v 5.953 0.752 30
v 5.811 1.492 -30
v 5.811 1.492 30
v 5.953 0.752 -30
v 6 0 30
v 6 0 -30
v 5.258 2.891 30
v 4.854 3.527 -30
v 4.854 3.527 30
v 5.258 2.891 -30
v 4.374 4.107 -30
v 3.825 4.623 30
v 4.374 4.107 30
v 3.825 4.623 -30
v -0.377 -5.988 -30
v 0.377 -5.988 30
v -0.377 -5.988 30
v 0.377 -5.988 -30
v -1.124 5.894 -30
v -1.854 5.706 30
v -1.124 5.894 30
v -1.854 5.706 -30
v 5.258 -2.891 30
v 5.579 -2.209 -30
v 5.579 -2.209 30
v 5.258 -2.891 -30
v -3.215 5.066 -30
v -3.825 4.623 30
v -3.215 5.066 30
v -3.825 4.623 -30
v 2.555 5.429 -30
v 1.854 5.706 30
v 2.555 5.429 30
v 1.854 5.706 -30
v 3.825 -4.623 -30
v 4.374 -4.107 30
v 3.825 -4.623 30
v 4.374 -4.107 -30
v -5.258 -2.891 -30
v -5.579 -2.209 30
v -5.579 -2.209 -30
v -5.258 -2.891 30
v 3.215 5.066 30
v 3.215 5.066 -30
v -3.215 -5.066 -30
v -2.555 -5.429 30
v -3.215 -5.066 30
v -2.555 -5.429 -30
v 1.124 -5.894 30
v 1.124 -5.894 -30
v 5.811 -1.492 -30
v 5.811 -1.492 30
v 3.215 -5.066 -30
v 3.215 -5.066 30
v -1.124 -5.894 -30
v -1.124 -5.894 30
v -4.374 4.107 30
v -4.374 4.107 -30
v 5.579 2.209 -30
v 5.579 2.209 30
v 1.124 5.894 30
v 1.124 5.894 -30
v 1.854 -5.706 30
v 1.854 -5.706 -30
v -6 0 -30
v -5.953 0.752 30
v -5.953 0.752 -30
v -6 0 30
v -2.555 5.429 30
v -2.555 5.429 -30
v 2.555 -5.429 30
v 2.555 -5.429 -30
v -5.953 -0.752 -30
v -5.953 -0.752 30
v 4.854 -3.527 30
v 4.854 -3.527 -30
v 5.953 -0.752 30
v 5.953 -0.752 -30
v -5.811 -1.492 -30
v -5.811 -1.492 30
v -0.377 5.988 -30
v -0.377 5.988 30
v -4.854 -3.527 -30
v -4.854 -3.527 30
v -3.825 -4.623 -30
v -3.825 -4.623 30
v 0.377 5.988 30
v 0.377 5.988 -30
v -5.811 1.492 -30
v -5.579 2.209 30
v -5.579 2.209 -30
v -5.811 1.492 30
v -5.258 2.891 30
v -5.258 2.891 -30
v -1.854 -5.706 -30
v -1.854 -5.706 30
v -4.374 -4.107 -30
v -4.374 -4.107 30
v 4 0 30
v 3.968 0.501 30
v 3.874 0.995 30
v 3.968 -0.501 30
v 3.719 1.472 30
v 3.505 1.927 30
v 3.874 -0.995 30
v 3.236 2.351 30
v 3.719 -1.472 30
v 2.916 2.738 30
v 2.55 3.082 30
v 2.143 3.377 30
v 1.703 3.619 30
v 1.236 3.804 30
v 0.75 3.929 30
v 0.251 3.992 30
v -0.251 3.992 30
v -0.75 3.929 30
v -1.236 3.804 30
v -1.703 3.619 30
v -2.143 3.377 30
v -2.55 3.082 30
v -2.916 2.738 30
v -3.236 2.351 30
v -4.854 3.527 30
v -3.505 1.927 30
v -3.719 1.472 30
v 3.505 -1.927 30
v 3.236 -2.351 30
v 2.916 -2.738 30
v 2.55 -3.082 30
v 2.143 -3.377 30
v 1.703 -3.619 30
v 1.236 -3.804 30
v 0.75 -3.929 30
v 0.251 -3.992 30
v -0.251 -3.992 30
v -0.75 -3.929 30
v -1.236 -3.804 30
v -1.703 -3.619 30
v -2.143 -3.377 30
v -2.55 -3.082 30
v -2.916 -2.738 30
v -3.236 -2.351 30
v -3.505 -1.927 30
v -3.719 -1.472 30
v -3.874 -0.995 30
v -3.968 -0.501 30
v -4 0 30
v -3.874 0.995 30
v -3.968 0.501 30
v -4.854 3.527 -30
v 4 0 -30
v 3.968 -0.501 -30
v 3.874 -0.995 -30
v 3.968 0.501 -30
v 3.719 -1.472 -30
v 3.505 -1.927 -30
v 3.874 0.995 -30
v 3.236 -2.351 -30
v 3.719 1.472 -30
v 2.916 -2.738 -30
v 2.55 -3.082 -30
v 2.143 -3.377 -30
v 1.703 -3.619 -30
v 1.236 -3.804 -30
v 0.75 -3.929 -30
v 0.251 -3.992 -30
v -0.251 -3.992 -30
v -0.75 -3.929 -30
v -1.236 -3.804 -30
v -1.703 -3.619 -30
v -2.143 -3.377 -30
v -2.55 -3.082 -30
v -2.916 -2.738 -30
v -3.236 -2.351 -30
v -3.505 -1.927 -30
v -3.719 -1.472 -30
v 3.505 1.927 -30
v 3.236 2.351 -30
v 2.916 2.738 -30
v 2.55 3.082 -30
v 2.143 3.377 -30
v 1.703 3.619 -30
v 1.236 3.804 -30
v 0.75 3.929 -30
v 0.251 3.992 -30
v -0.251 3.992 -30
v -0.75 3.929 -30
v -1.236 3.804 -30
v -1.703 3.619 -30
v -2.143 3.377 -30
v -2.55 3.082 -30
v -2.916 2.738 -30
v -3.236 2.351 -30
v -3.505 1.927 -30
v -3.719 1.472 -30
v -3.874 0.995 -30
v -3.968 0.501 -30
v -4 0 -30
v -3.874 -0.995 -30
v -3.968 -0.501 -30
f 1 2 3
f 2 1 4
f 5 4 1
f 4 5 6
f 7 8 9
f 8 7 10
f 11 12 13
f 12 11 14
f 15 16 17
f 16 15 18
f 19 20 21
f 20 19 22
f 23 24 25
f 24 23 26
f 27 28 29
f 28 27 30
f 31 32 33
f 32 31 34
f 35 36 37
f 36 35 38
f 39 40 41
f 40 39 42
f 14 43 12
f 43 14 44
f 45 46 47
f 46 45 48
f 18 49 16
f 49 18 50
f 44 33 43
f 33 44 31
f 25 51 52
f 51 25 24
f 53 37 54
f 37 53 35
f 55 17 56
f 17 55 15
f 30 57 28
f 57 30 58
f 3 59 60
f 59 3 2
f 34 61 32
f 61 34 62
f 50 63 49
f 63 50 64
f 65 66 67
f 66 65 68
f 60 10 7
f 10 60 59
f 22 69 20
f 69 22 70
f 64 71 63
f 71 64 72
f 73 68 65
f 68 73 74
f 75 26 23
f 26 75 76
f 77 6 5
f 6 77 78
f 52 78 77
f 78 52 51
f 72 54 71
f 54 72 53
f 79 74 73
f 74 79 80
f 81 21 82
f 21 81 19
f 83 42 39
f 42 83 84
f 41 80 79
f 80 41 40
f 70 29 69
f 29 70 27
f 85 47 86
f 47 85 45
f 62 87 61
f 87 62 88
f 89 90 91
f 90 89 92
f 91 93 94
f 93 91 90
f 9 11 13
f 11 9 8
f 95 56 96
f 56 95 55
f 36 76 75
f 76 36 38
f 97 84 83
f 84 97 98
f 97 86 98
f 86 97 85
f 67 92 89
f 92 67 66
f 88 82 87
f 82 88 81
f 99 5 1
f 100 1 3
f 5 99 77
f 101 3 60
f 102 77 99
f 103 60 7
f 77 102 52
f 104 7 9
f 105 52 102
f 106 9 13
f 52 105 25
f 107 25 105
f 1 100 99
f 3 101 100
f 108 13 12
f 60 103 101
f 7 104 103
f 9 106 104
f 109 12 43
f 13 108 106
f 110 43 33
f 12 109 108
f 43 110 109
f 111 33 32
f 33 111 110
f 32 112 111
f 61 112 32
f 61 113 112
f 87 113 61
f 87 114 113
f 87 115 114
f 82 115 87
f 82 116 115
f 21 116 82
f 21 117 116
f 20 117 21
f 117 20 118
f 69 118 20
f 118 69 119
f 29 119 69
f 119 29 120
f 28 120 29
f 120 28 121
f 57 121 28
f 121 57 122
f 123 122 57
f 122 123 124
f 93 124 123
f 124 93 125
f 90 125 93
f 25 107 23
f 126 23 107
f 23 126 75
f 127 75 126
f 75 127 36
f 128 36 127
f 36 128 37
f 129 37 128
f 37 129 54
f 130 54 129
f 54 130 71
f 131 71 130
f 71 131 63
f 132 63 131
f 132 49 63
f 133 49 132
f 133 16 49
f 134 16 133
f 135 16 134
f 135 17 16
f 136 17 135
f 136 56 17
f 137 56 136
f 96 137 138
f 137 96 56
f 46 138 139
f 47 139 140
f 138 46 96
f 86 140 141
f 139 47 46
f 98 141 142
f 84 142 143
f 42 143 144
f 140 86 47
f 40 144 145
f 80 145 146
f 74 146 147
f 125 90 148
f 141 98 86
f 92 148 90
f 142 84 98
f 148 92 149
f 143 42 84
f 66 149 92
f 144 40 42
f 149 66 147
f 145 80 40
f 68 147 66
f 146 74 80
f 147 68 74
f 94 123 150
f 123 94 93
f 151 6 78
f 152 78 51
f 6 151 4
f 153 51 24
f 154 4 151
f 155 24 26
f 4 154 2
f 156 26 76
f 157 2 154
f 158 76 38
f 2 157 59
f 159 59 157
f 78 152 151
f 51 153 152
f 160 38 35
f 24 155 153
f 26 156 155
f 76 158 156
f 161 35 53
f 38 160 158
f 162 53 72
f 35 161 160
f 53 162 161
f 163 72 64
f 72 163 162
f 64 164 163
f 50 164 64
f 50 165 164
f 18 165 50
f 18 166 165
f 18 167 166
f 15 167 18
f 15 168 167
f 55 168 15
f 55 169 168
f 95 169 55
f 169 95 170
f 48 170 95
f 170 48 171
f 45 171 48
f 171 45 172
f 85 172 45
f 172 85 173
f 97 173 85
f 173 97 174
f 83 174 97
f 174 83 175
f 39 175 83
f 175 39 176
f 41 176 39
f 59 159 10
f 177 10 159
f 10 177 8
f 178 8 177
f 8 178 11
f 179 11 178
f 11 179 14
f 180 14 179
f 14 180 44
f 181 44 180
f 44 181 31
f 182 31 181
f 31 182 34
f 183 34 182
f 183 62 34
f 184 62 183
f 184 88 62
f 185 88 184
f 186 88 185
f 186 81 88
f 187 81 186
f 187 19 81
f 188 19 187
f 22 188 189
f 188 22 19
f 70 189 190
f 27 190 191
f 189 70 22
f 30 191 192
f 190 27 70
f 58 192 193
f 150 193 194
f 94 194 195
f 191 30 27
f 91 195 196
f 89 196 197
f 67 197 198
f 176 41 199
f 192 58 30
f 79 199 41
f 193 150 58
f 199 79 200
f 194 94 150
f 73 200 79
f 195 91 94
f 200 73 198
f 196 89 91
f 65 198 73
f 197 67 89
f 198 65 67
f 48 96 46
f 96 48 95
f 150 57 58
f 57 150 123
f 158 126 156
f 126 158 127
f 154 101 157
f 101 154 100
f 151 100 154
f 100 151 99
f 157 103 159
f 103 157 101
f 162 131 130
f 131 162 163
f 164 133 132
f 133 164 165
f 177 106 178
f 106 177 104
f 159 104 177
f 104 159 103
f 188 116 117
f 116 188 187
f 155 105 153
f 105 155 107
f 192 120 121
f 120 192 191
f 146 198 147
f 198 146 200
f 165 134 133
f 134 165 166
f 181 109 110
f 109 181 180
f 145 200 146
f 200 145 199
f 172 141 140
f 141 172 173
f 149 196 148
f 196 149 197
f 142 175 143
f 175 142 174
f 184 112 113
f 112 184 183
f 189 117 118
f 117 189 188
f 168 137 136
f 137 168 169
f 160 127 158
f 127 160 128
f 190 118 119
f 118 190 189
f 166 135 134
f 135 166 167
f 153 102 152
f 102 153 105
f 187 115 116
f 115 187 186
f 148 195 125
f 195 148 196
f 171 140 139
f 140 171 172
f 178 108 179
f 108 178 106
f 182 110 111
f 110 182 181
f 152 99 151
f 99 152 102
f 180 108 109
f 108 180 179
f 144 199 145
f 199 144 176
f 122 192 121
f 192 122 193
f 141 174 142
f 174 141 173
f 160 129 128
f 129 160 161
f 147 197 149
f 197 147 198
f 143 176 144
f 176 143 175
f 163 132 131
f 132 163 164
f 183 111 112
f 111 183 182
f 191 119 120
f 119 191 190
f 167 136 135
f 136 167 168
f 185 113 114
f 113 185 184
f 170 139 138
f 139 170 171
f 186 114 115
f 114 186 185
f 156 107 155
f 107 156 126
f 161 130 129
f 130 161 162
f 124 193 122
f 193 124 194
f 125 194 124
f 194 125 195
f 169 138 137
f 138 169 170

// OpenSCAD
$fn = 50;


difference() {
	union() {
		translate(v = [0, 0, -30.0000000000]) {
			cylinder(h = 60, r = 6.0000000000);
		}
	}
	union() {
		translate(v = [0, 0, -100.0000000000]) {
			cylinder(h = 200, r = 4.0000000000);
		}
	}
}
